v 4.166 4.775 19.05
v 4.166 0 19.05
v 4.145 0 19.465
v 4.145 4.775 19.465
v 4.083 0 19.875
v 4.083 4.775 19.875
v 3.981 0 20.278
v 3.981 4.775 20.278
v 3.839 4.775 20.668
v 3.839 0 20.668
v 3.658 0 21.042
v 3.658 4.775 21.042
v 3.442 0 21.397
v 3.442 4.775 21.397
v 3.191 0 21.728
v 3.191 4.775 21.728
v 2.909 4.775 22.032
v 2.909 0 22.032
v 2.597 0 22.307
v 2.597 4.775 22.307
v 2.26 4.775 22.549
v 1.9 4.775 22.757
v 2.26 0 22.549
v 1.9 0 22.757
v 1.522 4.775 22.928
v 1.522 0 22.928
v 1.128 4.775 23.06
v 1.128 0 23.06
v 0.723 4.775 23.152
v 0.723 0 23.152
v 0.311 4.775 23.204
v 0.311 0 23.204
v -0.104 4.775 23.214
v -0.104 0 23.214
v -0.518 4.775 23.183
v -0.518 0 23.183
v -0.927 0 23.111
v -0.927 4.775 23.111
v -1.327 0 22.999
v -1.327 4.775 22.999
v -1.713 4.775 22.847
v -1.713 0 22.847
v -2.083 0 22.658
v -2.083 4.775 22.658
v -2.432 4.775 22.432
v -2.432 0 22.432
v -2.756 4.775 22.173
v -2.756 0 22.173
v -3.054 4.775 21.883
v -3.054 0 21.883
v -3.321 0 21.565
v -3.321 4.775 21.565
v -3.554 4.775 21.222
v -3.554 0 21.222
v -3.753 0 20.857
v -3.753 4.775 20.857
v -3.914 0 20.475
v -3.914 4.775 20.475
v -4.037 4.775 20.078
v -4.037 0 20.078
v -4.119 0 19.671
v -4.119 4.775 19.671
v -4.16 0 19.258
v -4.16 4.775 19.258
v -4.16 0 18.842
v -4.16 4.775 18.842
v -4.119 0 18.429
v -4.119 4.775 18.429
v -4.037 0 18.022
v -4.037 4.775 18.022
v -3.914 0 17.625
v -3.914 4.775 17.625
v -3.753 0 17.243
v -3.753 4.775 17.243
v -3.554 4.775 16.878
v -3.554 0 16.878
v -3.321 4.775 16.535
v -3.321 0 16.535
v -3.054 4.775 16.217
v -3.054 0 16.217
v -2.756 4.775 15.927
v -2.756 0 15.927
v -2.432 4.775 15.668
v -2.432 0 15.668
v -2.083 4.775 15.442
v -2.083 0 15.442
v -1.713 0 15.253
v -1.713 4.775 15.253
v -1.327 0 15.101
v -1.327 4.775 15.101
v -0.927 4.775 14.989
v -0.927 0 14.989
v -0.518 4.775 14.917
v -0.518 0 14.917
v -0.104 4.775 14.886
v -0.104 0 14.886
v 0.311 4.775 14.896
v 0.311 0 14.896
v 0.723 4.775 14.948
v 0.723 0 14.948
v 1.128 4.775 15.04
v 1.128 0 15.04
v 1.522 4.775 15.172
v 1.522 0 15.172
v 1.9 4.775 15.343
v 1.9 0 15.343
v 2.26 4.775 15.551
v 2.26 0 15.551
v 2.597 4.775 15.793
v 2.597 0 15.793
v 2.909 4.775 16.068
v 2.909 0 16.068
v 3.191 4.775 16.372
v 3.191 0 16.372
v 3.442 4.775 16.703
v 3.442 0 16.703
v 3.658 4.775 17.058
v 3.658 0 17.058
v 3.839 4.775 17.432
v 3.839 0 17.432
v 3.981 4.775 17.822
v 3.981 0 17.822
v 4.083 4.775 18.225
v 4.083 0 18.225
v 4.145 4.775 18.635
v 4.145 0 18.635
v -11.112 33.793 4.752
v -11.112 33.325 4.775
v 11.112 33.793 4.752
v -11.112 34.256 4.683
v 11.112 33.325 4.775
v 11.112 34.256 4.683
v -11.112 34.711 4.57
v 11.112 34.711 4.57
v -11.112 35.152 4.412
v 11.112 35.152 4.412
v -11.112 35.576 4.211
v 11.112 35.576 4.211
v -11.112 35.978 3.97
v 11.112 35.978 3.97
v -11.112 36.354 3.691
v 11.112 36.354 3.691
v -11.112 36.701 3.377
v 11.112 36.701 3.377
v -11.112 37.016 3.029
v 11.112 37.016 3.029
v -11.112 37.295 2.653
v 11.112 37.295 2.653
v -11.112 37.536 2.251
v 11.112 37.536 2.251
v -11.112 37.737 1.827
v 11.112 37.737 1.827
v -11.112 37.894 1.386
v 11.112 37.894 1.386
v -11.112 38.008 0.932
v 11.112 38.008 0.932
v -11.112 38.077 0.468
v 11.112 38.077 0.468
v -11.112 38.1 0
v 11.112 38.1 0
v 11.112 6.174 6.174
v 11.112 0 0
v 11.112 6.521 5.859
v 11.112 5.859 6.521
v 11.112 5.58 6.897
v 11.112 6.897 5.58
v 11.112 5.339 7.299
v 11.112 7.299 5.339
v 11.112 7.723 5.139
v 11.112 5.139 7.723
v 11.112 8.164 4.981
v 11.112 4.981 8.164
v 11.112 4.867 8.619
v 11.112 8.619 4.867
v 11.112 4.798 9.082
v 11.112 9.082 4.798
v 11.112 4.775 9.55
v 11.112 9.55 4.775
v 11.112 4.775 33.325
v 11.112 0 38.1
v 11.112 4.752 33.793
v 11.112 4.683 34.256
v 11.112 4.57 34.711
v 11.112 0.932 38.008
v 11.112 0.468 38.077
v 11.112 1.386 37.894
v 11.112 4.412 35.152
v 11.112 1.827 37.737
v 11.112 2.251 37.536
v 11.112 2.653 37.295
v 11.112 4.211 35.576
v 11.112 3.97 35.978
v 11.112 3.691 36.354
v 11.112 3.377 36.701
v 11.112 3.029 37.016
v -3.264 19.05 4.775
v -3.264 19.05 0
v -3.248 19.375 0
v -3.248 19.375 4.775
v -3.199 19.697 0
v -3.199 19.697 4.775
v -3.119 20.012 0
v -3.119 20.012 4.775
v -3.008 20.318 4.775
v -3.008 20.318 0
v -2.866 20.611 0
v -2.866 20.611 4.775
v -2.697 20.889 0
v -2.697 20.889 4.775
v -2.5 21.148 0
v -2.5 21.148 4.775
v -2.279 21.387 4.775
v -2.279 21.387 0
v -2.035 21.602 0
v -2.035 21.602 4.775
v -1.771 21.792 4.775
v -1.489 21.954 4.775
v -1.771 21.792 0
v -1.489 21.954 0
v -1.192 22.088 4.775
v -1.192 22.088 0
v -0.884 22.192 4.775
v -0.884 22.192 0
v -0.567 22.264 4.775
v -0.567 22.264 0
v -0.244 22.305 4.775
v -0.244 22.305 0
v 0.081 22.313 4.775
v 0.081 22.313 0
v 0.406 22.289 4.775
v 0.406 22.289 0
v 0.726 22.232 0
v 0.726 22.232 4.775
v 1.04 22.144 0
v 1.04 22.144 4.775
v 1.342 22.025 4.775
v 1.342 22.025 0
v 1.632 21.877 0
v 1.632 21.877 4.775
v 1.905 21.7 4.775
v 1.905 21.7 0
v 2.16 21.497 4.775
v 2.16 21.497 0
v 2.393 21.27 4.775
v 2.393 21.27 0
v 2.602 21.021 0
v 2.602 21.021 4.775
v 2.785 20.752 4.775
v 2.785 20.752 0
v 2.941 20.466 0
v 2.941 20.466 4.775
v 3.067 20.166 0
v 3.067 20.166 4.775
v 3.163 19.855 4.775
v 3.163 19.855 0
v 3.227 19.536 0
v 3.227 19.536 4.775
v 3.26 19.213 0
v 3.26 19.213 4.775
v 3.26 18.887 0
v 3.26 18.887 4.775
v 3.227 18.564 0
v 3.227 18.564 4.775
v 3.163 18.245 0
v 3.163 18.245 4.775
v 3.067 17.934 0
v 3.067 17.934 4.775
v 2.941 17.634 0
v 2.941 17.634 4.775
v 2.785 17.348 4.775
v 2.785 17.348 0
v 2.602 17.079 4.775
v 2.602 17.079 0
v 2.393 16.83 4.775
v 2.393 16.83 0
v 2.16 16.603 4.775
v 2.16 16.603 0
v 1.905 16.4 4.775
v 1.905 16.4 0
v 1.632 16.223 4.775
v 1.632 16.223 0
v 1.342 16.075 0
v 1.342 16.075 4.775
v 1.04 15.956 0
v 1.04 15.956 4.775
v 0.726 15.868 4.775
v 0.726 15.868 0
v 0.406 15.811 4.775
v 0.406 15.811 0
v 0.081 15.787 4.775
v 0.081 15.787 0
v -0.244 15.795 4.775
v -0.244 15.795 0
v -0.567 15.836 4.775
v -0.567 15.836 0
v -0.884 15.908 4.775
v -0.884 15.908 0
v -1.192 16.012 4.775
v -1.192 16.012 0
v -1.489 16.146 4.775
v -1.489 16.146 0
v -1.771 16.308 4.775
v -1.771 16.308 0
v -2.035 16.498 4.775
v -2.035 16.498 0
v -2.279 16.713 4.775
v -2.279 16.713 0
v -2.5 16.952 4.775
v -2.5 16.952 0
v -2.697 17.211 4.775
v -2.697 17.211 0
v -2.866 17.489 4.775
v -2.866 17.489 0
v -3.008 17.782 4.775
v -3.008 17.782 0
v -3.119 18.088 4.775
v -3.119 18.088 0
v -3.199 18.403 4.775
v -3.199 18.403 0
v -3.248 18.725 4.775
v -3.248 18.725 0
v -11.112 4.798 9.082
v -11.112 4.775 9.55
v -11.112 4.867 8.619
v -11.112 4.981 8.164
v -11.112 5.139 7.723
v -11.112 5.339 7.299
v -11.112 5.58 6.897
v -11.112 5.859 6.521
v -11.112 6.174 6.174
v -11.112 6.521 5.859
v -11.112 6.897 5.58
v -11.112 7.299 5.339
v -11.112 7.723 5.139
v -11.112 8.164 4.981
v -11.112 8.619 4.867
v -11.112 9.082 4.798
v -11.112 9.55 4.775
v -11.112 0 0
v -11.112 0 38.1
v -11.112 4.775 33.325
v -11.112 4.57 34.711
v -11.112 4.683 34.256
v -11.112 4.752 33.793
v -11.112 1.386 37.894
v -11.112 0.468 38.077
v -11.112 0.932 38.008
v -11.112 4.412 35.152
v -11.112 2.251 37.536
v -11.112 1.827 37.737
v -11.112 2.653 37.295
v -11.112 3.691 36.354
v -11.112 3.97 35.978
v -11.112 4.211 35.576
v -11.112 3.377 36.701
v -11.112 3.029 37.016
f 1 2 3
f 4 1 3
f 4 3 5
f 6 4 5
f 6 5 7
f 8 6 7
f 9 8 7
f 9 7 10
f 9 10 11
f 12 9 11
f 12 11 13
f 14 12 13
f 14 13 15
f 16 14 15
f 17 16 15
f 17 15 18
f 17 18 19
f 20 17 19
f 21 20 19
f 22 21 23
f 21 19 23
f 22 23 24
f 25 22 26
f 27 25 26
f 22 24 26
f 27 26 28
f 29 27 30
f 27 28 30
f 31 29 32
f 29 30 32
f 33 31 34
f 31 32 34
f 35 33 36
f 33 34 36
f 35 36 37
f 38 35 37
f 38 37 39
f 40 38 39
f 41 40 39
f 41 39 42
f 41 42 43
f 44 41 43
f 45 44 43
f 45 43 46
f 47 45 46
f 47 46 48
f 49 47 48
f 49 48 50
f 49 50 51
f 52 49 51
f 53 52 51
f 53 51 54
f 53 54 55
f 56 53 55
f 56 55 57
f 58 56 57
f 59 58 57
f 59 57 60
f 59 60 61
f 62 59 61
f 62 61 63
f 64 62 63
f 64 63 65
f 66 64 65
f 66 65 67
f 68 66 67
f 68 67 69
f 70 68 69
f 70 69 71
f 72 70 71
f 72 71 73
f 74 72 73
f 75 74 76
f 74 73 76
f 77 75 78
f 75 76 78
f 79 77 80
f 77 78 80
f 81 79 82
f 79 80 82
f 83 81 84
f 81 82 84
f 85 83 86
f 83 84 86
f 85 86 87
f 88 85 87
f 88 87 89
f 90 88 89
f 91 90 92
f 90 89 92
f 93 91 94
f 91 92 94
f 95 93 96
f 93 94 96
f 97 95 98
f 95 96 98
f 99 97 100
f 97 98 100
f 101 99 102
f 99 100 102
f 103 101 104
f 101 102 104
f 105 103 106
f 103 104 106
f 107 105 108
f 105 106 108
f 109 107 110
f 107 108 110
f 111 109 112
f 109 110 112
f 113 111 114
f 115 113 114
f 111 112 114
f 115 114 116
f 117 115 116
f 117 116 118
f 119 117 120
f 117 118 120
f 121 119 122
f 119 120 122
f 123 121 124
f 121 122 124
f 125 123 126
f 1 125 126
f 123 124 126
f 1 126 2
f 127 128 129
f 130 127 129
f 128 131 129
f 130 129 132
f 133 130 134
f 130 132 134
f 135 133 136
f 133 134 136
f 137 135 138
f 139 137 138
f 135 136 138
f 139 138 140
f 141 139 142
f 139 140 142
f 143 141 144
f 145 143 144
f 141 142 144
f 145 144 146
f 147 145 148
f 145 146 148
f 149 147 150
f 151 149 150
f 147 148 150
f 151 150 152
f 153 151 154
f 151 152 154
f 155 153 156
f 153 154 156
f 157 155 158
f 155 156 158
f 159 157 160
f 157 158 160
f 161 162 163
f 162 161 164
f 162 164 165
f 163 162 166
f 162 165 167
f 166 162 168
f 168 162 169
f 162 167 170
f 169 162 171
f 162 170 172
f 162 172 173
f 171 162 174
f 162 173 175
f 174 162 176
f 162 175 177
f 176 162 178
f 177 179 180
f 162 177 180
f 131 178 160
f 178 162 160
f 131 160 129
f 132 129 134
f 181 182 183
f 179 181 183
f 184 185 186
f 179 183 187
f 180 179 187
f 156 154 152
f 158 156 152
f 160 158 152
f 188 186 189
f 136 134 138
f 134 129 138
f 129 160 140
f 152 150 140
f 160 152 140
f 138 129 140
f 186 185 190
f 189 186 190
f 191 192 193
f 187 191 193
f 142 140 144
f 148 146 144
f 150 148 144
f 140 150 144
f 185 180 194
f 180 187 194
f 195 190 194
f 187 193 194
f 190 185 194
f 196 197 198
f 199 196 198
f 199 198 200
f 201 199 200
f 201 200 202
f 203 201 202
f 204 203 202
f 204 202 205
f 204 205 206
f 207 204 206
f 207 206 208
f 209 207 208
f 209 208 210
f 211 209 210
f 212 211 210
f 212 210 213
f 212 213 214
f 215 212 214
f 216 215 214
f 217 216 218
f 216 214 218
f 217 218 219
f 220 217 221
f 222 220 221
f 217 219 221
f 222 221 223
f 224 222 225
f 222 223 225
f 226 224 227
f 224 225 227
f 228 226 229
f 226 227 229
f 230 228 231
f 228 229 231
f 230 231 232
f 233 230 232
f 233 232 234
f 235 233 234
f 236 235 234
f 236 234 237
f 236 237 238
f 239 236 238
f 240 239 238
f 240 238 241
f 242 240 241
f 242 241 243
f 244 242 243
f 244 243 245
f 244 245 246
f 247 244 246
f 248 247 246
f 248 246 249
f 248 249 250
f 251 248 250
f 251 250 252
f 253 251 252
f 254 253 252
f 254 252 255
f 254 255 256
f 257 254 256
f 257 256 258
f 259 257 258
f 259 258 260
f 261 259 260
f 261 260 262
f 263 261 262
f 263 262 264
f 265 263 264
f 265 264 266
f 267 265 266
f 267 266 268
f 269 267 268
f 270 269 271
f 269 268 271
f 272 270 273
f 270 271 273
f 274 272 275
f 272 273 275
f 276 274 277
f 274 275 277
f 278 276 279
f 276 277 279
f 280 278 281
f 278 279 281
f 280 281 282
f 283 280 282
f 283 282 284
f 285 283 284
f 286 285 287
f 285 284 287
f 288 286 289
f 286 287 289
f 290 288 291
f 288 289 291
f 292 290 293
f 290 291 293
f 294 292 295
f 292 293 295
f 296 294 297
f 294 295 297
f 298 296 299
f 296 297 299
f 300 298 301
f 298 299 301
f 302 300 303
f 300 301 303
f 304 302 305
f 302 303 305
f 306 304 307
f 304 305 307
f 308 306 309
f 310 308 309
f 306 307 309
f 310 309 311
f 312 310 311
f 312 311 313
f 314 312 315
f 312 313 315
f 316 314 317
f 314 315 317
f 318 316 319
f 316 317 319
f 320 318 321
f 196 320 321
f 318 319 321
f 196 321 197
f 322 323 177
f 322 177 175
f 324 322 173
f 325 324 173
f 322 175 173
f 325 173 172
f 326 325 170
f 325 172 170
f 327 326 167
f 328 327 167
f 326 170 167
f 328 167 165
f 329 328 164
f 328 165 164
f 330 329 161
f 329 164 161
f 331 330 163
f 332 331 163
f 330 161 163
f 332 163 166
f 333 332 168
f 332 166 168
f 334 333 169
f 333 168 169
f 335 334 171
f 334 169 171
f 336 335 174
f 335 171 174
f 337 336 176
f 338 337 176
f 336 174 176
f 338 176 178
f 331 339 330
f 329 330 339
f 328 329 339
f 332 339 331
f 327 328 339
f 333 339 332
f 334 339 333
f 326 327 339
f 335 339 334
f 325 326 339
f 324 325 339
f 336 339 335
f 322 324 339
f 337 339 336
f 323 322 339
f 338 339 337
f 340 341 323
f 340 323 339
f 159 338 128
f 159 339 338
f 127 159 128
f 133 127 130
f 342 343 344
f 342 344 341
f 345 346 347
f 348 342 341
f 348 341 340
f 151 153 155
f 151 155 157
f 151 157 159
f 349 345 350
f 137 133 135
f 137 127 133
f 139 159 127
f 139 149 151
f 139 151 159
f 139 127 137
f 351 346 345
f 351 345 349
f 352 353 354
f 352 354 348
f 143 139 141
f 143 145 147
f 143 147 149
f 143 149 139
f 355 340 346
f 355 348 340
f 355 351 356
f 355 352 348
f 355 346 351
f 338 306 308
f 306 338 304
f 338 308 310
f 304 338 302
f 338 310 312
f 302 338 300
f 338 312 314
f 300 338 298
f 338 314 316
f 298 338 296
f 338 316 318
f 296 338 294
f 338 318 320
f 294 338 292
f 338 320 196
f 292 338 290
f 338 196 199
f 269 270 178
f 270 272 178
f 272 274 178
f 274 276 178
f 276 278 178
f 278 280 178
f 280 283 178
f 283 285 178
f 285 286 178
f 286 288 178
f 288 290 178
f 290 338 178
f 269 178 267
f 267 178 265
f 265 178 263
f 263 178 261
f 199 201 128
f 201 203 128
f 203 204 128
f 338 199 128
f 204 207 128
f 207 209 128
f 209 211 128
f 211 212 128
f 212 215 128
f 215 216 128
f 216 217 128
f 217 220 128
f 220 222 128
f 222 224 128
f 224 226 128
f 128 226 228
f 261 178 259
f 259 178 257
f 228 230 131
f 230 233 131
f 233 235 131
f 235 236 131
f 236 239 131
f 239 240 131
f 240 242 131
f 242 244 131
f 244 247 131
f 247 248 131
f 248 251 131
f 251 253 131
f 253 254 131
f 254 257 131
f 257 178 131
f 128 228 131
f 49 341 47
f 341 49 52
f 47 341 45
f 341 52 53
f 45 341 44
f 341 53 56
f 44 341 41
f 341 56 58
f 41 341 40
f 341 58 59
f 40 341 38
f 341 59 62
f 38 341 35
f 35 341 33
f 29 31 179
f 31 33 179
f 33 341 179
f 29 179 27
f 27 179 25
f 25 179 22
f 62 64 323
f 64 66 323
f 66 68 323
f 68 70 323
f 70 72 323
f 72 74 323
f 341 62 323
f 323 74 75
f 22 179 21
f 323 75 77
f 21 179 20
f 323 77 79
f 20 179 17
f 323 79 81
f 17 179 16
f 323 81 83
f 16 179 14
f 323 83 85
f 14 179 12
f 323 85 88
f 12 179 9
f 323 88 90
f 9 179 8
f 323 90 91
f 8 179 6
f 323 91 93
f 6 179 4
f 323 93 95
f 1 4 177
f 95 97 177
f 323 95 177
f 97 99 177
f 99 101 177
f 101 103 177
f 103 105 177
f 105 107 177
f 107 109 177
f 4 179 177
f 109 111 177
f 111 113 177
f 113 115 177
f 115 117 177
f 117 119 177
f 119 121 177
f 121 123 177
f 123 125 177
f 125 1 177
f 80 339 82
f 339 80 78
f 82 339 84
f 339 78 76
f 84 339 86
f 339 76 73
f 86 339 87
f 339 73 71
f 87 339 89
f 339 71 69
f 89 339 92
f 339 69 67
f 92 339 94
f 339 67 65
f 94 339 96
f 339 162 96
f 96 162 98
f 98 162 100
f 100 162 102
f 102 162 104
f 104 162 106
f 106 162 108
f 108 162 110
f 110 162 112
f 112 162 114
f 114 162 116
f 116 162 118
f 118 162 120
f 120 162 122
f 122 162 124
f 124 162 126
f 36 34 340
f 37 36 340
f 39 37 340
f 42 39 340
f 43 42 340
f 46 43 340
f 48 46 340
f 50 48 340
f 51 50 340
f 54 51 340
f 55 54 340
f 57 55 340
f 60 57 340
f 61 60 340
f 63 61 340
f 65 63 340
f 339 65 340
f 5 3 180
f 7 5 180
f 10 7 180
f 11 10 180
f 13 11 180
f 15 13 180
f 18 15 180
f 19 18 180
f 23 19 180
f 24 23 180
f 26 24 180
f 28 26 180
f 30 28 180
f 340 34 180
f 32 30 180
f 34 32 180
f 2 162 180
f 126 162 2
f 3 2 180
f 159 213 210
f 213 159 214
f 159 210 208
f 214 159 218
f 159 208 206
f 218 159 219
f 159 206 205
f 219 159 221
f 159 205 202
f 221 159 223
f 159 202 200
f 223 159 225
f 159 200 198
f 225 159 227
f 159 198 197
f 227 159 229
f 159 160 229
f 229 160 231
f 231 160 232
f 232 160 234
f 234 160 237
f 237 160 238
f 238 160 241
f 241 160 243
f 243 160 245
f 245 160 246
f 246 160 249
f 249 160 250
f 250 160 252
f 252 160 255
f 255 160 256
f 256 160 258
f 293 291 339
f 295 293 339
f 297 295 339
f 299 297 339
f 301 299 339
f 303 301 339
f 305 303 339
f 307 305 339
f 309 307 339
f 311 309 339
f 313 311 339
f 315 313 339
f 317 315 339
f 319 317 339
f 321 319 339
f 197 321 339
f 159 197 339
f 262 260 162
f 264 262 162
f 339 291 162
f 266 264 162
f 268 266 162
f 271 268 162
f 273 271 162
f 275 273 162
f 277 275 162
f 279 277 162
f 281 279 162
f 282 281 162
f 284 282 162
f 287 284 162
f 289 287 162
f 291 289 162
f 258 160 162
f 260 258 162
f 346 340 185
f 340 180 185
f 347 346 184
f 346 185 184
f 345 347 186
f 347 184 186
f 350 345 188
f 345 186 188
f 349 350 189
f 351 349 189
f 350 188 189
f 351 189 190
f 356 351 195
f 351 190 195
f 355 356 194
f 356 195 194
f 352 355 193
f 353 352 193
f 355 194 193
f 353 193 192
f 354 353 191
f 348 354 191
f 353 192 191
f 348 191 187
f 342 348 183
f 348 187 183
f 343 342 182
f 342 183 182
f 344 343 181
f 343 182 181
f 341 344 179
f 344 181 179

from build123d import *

# Parameters (mm, degrees)
BASE_EXTRUDE_DEPTH = 11.1125
SKETCH2_R          = 4.1656
HOLE1_DEPTH        = 39.1
SKETCH3_R          = 3.2639
HOLE2_DEPTH        = 39.1


with BuildPart() as part:
    # Sketch1 → Base Extrude (new body, symmetric)
    with BuildSketch(Plane(origin=(0, 0, 0), x_dir=(0, 0, -1), z_dir=(1, 0, 0))):
        with BuildLine():
            Line((-4.7752, 9.5504), (-4.7752, 33.3248))
            ThreePointArc((-4.7752, 33.3248), (-3.376576302, 36.701376302), (0, 38.1))
            Line((0, 38.1), (0, 0))
            Line((0, 0), (-38.1, 0))
            ThreePointArc((-38.1, 0), (-36.701376302, 3.376576302), (-33.3248, 4.7752))
            Line((-33.3248, 4.7752), (-9.5504, 4.7752))
            ThreePointArc((-9.5504, 4.7752), (-6.173823698, 6.173823698), (-4.7752, 9.5504))
        make_face()
    extrude(amount=BASE_EXTRUDE_DEPTH, both=True)

    # Sketch2 → Hole1 (cut, through all)
    with BuildSketch(Plane.XZ):
        with Locations((0, 19.05)):
            Circle(SKETCH2_R)
    extrude(amount=-HOLE1_DEPTH, mode=Mode.SUBTRACT)

    # Sketch3 → Hole2 (cut, through all)
    with BuildSketch(Plane(origin=(0, 0, 0), x_dir=(-1, 0, 0), z_dir=(0, 0, -1))):
        with Locations((0, 19.05)):
            Circle(SKETCH3_R)
    extrude(amount=-HOLE2_DEPTH, mode=Mode.SUBTRACT)


solid = part.part
